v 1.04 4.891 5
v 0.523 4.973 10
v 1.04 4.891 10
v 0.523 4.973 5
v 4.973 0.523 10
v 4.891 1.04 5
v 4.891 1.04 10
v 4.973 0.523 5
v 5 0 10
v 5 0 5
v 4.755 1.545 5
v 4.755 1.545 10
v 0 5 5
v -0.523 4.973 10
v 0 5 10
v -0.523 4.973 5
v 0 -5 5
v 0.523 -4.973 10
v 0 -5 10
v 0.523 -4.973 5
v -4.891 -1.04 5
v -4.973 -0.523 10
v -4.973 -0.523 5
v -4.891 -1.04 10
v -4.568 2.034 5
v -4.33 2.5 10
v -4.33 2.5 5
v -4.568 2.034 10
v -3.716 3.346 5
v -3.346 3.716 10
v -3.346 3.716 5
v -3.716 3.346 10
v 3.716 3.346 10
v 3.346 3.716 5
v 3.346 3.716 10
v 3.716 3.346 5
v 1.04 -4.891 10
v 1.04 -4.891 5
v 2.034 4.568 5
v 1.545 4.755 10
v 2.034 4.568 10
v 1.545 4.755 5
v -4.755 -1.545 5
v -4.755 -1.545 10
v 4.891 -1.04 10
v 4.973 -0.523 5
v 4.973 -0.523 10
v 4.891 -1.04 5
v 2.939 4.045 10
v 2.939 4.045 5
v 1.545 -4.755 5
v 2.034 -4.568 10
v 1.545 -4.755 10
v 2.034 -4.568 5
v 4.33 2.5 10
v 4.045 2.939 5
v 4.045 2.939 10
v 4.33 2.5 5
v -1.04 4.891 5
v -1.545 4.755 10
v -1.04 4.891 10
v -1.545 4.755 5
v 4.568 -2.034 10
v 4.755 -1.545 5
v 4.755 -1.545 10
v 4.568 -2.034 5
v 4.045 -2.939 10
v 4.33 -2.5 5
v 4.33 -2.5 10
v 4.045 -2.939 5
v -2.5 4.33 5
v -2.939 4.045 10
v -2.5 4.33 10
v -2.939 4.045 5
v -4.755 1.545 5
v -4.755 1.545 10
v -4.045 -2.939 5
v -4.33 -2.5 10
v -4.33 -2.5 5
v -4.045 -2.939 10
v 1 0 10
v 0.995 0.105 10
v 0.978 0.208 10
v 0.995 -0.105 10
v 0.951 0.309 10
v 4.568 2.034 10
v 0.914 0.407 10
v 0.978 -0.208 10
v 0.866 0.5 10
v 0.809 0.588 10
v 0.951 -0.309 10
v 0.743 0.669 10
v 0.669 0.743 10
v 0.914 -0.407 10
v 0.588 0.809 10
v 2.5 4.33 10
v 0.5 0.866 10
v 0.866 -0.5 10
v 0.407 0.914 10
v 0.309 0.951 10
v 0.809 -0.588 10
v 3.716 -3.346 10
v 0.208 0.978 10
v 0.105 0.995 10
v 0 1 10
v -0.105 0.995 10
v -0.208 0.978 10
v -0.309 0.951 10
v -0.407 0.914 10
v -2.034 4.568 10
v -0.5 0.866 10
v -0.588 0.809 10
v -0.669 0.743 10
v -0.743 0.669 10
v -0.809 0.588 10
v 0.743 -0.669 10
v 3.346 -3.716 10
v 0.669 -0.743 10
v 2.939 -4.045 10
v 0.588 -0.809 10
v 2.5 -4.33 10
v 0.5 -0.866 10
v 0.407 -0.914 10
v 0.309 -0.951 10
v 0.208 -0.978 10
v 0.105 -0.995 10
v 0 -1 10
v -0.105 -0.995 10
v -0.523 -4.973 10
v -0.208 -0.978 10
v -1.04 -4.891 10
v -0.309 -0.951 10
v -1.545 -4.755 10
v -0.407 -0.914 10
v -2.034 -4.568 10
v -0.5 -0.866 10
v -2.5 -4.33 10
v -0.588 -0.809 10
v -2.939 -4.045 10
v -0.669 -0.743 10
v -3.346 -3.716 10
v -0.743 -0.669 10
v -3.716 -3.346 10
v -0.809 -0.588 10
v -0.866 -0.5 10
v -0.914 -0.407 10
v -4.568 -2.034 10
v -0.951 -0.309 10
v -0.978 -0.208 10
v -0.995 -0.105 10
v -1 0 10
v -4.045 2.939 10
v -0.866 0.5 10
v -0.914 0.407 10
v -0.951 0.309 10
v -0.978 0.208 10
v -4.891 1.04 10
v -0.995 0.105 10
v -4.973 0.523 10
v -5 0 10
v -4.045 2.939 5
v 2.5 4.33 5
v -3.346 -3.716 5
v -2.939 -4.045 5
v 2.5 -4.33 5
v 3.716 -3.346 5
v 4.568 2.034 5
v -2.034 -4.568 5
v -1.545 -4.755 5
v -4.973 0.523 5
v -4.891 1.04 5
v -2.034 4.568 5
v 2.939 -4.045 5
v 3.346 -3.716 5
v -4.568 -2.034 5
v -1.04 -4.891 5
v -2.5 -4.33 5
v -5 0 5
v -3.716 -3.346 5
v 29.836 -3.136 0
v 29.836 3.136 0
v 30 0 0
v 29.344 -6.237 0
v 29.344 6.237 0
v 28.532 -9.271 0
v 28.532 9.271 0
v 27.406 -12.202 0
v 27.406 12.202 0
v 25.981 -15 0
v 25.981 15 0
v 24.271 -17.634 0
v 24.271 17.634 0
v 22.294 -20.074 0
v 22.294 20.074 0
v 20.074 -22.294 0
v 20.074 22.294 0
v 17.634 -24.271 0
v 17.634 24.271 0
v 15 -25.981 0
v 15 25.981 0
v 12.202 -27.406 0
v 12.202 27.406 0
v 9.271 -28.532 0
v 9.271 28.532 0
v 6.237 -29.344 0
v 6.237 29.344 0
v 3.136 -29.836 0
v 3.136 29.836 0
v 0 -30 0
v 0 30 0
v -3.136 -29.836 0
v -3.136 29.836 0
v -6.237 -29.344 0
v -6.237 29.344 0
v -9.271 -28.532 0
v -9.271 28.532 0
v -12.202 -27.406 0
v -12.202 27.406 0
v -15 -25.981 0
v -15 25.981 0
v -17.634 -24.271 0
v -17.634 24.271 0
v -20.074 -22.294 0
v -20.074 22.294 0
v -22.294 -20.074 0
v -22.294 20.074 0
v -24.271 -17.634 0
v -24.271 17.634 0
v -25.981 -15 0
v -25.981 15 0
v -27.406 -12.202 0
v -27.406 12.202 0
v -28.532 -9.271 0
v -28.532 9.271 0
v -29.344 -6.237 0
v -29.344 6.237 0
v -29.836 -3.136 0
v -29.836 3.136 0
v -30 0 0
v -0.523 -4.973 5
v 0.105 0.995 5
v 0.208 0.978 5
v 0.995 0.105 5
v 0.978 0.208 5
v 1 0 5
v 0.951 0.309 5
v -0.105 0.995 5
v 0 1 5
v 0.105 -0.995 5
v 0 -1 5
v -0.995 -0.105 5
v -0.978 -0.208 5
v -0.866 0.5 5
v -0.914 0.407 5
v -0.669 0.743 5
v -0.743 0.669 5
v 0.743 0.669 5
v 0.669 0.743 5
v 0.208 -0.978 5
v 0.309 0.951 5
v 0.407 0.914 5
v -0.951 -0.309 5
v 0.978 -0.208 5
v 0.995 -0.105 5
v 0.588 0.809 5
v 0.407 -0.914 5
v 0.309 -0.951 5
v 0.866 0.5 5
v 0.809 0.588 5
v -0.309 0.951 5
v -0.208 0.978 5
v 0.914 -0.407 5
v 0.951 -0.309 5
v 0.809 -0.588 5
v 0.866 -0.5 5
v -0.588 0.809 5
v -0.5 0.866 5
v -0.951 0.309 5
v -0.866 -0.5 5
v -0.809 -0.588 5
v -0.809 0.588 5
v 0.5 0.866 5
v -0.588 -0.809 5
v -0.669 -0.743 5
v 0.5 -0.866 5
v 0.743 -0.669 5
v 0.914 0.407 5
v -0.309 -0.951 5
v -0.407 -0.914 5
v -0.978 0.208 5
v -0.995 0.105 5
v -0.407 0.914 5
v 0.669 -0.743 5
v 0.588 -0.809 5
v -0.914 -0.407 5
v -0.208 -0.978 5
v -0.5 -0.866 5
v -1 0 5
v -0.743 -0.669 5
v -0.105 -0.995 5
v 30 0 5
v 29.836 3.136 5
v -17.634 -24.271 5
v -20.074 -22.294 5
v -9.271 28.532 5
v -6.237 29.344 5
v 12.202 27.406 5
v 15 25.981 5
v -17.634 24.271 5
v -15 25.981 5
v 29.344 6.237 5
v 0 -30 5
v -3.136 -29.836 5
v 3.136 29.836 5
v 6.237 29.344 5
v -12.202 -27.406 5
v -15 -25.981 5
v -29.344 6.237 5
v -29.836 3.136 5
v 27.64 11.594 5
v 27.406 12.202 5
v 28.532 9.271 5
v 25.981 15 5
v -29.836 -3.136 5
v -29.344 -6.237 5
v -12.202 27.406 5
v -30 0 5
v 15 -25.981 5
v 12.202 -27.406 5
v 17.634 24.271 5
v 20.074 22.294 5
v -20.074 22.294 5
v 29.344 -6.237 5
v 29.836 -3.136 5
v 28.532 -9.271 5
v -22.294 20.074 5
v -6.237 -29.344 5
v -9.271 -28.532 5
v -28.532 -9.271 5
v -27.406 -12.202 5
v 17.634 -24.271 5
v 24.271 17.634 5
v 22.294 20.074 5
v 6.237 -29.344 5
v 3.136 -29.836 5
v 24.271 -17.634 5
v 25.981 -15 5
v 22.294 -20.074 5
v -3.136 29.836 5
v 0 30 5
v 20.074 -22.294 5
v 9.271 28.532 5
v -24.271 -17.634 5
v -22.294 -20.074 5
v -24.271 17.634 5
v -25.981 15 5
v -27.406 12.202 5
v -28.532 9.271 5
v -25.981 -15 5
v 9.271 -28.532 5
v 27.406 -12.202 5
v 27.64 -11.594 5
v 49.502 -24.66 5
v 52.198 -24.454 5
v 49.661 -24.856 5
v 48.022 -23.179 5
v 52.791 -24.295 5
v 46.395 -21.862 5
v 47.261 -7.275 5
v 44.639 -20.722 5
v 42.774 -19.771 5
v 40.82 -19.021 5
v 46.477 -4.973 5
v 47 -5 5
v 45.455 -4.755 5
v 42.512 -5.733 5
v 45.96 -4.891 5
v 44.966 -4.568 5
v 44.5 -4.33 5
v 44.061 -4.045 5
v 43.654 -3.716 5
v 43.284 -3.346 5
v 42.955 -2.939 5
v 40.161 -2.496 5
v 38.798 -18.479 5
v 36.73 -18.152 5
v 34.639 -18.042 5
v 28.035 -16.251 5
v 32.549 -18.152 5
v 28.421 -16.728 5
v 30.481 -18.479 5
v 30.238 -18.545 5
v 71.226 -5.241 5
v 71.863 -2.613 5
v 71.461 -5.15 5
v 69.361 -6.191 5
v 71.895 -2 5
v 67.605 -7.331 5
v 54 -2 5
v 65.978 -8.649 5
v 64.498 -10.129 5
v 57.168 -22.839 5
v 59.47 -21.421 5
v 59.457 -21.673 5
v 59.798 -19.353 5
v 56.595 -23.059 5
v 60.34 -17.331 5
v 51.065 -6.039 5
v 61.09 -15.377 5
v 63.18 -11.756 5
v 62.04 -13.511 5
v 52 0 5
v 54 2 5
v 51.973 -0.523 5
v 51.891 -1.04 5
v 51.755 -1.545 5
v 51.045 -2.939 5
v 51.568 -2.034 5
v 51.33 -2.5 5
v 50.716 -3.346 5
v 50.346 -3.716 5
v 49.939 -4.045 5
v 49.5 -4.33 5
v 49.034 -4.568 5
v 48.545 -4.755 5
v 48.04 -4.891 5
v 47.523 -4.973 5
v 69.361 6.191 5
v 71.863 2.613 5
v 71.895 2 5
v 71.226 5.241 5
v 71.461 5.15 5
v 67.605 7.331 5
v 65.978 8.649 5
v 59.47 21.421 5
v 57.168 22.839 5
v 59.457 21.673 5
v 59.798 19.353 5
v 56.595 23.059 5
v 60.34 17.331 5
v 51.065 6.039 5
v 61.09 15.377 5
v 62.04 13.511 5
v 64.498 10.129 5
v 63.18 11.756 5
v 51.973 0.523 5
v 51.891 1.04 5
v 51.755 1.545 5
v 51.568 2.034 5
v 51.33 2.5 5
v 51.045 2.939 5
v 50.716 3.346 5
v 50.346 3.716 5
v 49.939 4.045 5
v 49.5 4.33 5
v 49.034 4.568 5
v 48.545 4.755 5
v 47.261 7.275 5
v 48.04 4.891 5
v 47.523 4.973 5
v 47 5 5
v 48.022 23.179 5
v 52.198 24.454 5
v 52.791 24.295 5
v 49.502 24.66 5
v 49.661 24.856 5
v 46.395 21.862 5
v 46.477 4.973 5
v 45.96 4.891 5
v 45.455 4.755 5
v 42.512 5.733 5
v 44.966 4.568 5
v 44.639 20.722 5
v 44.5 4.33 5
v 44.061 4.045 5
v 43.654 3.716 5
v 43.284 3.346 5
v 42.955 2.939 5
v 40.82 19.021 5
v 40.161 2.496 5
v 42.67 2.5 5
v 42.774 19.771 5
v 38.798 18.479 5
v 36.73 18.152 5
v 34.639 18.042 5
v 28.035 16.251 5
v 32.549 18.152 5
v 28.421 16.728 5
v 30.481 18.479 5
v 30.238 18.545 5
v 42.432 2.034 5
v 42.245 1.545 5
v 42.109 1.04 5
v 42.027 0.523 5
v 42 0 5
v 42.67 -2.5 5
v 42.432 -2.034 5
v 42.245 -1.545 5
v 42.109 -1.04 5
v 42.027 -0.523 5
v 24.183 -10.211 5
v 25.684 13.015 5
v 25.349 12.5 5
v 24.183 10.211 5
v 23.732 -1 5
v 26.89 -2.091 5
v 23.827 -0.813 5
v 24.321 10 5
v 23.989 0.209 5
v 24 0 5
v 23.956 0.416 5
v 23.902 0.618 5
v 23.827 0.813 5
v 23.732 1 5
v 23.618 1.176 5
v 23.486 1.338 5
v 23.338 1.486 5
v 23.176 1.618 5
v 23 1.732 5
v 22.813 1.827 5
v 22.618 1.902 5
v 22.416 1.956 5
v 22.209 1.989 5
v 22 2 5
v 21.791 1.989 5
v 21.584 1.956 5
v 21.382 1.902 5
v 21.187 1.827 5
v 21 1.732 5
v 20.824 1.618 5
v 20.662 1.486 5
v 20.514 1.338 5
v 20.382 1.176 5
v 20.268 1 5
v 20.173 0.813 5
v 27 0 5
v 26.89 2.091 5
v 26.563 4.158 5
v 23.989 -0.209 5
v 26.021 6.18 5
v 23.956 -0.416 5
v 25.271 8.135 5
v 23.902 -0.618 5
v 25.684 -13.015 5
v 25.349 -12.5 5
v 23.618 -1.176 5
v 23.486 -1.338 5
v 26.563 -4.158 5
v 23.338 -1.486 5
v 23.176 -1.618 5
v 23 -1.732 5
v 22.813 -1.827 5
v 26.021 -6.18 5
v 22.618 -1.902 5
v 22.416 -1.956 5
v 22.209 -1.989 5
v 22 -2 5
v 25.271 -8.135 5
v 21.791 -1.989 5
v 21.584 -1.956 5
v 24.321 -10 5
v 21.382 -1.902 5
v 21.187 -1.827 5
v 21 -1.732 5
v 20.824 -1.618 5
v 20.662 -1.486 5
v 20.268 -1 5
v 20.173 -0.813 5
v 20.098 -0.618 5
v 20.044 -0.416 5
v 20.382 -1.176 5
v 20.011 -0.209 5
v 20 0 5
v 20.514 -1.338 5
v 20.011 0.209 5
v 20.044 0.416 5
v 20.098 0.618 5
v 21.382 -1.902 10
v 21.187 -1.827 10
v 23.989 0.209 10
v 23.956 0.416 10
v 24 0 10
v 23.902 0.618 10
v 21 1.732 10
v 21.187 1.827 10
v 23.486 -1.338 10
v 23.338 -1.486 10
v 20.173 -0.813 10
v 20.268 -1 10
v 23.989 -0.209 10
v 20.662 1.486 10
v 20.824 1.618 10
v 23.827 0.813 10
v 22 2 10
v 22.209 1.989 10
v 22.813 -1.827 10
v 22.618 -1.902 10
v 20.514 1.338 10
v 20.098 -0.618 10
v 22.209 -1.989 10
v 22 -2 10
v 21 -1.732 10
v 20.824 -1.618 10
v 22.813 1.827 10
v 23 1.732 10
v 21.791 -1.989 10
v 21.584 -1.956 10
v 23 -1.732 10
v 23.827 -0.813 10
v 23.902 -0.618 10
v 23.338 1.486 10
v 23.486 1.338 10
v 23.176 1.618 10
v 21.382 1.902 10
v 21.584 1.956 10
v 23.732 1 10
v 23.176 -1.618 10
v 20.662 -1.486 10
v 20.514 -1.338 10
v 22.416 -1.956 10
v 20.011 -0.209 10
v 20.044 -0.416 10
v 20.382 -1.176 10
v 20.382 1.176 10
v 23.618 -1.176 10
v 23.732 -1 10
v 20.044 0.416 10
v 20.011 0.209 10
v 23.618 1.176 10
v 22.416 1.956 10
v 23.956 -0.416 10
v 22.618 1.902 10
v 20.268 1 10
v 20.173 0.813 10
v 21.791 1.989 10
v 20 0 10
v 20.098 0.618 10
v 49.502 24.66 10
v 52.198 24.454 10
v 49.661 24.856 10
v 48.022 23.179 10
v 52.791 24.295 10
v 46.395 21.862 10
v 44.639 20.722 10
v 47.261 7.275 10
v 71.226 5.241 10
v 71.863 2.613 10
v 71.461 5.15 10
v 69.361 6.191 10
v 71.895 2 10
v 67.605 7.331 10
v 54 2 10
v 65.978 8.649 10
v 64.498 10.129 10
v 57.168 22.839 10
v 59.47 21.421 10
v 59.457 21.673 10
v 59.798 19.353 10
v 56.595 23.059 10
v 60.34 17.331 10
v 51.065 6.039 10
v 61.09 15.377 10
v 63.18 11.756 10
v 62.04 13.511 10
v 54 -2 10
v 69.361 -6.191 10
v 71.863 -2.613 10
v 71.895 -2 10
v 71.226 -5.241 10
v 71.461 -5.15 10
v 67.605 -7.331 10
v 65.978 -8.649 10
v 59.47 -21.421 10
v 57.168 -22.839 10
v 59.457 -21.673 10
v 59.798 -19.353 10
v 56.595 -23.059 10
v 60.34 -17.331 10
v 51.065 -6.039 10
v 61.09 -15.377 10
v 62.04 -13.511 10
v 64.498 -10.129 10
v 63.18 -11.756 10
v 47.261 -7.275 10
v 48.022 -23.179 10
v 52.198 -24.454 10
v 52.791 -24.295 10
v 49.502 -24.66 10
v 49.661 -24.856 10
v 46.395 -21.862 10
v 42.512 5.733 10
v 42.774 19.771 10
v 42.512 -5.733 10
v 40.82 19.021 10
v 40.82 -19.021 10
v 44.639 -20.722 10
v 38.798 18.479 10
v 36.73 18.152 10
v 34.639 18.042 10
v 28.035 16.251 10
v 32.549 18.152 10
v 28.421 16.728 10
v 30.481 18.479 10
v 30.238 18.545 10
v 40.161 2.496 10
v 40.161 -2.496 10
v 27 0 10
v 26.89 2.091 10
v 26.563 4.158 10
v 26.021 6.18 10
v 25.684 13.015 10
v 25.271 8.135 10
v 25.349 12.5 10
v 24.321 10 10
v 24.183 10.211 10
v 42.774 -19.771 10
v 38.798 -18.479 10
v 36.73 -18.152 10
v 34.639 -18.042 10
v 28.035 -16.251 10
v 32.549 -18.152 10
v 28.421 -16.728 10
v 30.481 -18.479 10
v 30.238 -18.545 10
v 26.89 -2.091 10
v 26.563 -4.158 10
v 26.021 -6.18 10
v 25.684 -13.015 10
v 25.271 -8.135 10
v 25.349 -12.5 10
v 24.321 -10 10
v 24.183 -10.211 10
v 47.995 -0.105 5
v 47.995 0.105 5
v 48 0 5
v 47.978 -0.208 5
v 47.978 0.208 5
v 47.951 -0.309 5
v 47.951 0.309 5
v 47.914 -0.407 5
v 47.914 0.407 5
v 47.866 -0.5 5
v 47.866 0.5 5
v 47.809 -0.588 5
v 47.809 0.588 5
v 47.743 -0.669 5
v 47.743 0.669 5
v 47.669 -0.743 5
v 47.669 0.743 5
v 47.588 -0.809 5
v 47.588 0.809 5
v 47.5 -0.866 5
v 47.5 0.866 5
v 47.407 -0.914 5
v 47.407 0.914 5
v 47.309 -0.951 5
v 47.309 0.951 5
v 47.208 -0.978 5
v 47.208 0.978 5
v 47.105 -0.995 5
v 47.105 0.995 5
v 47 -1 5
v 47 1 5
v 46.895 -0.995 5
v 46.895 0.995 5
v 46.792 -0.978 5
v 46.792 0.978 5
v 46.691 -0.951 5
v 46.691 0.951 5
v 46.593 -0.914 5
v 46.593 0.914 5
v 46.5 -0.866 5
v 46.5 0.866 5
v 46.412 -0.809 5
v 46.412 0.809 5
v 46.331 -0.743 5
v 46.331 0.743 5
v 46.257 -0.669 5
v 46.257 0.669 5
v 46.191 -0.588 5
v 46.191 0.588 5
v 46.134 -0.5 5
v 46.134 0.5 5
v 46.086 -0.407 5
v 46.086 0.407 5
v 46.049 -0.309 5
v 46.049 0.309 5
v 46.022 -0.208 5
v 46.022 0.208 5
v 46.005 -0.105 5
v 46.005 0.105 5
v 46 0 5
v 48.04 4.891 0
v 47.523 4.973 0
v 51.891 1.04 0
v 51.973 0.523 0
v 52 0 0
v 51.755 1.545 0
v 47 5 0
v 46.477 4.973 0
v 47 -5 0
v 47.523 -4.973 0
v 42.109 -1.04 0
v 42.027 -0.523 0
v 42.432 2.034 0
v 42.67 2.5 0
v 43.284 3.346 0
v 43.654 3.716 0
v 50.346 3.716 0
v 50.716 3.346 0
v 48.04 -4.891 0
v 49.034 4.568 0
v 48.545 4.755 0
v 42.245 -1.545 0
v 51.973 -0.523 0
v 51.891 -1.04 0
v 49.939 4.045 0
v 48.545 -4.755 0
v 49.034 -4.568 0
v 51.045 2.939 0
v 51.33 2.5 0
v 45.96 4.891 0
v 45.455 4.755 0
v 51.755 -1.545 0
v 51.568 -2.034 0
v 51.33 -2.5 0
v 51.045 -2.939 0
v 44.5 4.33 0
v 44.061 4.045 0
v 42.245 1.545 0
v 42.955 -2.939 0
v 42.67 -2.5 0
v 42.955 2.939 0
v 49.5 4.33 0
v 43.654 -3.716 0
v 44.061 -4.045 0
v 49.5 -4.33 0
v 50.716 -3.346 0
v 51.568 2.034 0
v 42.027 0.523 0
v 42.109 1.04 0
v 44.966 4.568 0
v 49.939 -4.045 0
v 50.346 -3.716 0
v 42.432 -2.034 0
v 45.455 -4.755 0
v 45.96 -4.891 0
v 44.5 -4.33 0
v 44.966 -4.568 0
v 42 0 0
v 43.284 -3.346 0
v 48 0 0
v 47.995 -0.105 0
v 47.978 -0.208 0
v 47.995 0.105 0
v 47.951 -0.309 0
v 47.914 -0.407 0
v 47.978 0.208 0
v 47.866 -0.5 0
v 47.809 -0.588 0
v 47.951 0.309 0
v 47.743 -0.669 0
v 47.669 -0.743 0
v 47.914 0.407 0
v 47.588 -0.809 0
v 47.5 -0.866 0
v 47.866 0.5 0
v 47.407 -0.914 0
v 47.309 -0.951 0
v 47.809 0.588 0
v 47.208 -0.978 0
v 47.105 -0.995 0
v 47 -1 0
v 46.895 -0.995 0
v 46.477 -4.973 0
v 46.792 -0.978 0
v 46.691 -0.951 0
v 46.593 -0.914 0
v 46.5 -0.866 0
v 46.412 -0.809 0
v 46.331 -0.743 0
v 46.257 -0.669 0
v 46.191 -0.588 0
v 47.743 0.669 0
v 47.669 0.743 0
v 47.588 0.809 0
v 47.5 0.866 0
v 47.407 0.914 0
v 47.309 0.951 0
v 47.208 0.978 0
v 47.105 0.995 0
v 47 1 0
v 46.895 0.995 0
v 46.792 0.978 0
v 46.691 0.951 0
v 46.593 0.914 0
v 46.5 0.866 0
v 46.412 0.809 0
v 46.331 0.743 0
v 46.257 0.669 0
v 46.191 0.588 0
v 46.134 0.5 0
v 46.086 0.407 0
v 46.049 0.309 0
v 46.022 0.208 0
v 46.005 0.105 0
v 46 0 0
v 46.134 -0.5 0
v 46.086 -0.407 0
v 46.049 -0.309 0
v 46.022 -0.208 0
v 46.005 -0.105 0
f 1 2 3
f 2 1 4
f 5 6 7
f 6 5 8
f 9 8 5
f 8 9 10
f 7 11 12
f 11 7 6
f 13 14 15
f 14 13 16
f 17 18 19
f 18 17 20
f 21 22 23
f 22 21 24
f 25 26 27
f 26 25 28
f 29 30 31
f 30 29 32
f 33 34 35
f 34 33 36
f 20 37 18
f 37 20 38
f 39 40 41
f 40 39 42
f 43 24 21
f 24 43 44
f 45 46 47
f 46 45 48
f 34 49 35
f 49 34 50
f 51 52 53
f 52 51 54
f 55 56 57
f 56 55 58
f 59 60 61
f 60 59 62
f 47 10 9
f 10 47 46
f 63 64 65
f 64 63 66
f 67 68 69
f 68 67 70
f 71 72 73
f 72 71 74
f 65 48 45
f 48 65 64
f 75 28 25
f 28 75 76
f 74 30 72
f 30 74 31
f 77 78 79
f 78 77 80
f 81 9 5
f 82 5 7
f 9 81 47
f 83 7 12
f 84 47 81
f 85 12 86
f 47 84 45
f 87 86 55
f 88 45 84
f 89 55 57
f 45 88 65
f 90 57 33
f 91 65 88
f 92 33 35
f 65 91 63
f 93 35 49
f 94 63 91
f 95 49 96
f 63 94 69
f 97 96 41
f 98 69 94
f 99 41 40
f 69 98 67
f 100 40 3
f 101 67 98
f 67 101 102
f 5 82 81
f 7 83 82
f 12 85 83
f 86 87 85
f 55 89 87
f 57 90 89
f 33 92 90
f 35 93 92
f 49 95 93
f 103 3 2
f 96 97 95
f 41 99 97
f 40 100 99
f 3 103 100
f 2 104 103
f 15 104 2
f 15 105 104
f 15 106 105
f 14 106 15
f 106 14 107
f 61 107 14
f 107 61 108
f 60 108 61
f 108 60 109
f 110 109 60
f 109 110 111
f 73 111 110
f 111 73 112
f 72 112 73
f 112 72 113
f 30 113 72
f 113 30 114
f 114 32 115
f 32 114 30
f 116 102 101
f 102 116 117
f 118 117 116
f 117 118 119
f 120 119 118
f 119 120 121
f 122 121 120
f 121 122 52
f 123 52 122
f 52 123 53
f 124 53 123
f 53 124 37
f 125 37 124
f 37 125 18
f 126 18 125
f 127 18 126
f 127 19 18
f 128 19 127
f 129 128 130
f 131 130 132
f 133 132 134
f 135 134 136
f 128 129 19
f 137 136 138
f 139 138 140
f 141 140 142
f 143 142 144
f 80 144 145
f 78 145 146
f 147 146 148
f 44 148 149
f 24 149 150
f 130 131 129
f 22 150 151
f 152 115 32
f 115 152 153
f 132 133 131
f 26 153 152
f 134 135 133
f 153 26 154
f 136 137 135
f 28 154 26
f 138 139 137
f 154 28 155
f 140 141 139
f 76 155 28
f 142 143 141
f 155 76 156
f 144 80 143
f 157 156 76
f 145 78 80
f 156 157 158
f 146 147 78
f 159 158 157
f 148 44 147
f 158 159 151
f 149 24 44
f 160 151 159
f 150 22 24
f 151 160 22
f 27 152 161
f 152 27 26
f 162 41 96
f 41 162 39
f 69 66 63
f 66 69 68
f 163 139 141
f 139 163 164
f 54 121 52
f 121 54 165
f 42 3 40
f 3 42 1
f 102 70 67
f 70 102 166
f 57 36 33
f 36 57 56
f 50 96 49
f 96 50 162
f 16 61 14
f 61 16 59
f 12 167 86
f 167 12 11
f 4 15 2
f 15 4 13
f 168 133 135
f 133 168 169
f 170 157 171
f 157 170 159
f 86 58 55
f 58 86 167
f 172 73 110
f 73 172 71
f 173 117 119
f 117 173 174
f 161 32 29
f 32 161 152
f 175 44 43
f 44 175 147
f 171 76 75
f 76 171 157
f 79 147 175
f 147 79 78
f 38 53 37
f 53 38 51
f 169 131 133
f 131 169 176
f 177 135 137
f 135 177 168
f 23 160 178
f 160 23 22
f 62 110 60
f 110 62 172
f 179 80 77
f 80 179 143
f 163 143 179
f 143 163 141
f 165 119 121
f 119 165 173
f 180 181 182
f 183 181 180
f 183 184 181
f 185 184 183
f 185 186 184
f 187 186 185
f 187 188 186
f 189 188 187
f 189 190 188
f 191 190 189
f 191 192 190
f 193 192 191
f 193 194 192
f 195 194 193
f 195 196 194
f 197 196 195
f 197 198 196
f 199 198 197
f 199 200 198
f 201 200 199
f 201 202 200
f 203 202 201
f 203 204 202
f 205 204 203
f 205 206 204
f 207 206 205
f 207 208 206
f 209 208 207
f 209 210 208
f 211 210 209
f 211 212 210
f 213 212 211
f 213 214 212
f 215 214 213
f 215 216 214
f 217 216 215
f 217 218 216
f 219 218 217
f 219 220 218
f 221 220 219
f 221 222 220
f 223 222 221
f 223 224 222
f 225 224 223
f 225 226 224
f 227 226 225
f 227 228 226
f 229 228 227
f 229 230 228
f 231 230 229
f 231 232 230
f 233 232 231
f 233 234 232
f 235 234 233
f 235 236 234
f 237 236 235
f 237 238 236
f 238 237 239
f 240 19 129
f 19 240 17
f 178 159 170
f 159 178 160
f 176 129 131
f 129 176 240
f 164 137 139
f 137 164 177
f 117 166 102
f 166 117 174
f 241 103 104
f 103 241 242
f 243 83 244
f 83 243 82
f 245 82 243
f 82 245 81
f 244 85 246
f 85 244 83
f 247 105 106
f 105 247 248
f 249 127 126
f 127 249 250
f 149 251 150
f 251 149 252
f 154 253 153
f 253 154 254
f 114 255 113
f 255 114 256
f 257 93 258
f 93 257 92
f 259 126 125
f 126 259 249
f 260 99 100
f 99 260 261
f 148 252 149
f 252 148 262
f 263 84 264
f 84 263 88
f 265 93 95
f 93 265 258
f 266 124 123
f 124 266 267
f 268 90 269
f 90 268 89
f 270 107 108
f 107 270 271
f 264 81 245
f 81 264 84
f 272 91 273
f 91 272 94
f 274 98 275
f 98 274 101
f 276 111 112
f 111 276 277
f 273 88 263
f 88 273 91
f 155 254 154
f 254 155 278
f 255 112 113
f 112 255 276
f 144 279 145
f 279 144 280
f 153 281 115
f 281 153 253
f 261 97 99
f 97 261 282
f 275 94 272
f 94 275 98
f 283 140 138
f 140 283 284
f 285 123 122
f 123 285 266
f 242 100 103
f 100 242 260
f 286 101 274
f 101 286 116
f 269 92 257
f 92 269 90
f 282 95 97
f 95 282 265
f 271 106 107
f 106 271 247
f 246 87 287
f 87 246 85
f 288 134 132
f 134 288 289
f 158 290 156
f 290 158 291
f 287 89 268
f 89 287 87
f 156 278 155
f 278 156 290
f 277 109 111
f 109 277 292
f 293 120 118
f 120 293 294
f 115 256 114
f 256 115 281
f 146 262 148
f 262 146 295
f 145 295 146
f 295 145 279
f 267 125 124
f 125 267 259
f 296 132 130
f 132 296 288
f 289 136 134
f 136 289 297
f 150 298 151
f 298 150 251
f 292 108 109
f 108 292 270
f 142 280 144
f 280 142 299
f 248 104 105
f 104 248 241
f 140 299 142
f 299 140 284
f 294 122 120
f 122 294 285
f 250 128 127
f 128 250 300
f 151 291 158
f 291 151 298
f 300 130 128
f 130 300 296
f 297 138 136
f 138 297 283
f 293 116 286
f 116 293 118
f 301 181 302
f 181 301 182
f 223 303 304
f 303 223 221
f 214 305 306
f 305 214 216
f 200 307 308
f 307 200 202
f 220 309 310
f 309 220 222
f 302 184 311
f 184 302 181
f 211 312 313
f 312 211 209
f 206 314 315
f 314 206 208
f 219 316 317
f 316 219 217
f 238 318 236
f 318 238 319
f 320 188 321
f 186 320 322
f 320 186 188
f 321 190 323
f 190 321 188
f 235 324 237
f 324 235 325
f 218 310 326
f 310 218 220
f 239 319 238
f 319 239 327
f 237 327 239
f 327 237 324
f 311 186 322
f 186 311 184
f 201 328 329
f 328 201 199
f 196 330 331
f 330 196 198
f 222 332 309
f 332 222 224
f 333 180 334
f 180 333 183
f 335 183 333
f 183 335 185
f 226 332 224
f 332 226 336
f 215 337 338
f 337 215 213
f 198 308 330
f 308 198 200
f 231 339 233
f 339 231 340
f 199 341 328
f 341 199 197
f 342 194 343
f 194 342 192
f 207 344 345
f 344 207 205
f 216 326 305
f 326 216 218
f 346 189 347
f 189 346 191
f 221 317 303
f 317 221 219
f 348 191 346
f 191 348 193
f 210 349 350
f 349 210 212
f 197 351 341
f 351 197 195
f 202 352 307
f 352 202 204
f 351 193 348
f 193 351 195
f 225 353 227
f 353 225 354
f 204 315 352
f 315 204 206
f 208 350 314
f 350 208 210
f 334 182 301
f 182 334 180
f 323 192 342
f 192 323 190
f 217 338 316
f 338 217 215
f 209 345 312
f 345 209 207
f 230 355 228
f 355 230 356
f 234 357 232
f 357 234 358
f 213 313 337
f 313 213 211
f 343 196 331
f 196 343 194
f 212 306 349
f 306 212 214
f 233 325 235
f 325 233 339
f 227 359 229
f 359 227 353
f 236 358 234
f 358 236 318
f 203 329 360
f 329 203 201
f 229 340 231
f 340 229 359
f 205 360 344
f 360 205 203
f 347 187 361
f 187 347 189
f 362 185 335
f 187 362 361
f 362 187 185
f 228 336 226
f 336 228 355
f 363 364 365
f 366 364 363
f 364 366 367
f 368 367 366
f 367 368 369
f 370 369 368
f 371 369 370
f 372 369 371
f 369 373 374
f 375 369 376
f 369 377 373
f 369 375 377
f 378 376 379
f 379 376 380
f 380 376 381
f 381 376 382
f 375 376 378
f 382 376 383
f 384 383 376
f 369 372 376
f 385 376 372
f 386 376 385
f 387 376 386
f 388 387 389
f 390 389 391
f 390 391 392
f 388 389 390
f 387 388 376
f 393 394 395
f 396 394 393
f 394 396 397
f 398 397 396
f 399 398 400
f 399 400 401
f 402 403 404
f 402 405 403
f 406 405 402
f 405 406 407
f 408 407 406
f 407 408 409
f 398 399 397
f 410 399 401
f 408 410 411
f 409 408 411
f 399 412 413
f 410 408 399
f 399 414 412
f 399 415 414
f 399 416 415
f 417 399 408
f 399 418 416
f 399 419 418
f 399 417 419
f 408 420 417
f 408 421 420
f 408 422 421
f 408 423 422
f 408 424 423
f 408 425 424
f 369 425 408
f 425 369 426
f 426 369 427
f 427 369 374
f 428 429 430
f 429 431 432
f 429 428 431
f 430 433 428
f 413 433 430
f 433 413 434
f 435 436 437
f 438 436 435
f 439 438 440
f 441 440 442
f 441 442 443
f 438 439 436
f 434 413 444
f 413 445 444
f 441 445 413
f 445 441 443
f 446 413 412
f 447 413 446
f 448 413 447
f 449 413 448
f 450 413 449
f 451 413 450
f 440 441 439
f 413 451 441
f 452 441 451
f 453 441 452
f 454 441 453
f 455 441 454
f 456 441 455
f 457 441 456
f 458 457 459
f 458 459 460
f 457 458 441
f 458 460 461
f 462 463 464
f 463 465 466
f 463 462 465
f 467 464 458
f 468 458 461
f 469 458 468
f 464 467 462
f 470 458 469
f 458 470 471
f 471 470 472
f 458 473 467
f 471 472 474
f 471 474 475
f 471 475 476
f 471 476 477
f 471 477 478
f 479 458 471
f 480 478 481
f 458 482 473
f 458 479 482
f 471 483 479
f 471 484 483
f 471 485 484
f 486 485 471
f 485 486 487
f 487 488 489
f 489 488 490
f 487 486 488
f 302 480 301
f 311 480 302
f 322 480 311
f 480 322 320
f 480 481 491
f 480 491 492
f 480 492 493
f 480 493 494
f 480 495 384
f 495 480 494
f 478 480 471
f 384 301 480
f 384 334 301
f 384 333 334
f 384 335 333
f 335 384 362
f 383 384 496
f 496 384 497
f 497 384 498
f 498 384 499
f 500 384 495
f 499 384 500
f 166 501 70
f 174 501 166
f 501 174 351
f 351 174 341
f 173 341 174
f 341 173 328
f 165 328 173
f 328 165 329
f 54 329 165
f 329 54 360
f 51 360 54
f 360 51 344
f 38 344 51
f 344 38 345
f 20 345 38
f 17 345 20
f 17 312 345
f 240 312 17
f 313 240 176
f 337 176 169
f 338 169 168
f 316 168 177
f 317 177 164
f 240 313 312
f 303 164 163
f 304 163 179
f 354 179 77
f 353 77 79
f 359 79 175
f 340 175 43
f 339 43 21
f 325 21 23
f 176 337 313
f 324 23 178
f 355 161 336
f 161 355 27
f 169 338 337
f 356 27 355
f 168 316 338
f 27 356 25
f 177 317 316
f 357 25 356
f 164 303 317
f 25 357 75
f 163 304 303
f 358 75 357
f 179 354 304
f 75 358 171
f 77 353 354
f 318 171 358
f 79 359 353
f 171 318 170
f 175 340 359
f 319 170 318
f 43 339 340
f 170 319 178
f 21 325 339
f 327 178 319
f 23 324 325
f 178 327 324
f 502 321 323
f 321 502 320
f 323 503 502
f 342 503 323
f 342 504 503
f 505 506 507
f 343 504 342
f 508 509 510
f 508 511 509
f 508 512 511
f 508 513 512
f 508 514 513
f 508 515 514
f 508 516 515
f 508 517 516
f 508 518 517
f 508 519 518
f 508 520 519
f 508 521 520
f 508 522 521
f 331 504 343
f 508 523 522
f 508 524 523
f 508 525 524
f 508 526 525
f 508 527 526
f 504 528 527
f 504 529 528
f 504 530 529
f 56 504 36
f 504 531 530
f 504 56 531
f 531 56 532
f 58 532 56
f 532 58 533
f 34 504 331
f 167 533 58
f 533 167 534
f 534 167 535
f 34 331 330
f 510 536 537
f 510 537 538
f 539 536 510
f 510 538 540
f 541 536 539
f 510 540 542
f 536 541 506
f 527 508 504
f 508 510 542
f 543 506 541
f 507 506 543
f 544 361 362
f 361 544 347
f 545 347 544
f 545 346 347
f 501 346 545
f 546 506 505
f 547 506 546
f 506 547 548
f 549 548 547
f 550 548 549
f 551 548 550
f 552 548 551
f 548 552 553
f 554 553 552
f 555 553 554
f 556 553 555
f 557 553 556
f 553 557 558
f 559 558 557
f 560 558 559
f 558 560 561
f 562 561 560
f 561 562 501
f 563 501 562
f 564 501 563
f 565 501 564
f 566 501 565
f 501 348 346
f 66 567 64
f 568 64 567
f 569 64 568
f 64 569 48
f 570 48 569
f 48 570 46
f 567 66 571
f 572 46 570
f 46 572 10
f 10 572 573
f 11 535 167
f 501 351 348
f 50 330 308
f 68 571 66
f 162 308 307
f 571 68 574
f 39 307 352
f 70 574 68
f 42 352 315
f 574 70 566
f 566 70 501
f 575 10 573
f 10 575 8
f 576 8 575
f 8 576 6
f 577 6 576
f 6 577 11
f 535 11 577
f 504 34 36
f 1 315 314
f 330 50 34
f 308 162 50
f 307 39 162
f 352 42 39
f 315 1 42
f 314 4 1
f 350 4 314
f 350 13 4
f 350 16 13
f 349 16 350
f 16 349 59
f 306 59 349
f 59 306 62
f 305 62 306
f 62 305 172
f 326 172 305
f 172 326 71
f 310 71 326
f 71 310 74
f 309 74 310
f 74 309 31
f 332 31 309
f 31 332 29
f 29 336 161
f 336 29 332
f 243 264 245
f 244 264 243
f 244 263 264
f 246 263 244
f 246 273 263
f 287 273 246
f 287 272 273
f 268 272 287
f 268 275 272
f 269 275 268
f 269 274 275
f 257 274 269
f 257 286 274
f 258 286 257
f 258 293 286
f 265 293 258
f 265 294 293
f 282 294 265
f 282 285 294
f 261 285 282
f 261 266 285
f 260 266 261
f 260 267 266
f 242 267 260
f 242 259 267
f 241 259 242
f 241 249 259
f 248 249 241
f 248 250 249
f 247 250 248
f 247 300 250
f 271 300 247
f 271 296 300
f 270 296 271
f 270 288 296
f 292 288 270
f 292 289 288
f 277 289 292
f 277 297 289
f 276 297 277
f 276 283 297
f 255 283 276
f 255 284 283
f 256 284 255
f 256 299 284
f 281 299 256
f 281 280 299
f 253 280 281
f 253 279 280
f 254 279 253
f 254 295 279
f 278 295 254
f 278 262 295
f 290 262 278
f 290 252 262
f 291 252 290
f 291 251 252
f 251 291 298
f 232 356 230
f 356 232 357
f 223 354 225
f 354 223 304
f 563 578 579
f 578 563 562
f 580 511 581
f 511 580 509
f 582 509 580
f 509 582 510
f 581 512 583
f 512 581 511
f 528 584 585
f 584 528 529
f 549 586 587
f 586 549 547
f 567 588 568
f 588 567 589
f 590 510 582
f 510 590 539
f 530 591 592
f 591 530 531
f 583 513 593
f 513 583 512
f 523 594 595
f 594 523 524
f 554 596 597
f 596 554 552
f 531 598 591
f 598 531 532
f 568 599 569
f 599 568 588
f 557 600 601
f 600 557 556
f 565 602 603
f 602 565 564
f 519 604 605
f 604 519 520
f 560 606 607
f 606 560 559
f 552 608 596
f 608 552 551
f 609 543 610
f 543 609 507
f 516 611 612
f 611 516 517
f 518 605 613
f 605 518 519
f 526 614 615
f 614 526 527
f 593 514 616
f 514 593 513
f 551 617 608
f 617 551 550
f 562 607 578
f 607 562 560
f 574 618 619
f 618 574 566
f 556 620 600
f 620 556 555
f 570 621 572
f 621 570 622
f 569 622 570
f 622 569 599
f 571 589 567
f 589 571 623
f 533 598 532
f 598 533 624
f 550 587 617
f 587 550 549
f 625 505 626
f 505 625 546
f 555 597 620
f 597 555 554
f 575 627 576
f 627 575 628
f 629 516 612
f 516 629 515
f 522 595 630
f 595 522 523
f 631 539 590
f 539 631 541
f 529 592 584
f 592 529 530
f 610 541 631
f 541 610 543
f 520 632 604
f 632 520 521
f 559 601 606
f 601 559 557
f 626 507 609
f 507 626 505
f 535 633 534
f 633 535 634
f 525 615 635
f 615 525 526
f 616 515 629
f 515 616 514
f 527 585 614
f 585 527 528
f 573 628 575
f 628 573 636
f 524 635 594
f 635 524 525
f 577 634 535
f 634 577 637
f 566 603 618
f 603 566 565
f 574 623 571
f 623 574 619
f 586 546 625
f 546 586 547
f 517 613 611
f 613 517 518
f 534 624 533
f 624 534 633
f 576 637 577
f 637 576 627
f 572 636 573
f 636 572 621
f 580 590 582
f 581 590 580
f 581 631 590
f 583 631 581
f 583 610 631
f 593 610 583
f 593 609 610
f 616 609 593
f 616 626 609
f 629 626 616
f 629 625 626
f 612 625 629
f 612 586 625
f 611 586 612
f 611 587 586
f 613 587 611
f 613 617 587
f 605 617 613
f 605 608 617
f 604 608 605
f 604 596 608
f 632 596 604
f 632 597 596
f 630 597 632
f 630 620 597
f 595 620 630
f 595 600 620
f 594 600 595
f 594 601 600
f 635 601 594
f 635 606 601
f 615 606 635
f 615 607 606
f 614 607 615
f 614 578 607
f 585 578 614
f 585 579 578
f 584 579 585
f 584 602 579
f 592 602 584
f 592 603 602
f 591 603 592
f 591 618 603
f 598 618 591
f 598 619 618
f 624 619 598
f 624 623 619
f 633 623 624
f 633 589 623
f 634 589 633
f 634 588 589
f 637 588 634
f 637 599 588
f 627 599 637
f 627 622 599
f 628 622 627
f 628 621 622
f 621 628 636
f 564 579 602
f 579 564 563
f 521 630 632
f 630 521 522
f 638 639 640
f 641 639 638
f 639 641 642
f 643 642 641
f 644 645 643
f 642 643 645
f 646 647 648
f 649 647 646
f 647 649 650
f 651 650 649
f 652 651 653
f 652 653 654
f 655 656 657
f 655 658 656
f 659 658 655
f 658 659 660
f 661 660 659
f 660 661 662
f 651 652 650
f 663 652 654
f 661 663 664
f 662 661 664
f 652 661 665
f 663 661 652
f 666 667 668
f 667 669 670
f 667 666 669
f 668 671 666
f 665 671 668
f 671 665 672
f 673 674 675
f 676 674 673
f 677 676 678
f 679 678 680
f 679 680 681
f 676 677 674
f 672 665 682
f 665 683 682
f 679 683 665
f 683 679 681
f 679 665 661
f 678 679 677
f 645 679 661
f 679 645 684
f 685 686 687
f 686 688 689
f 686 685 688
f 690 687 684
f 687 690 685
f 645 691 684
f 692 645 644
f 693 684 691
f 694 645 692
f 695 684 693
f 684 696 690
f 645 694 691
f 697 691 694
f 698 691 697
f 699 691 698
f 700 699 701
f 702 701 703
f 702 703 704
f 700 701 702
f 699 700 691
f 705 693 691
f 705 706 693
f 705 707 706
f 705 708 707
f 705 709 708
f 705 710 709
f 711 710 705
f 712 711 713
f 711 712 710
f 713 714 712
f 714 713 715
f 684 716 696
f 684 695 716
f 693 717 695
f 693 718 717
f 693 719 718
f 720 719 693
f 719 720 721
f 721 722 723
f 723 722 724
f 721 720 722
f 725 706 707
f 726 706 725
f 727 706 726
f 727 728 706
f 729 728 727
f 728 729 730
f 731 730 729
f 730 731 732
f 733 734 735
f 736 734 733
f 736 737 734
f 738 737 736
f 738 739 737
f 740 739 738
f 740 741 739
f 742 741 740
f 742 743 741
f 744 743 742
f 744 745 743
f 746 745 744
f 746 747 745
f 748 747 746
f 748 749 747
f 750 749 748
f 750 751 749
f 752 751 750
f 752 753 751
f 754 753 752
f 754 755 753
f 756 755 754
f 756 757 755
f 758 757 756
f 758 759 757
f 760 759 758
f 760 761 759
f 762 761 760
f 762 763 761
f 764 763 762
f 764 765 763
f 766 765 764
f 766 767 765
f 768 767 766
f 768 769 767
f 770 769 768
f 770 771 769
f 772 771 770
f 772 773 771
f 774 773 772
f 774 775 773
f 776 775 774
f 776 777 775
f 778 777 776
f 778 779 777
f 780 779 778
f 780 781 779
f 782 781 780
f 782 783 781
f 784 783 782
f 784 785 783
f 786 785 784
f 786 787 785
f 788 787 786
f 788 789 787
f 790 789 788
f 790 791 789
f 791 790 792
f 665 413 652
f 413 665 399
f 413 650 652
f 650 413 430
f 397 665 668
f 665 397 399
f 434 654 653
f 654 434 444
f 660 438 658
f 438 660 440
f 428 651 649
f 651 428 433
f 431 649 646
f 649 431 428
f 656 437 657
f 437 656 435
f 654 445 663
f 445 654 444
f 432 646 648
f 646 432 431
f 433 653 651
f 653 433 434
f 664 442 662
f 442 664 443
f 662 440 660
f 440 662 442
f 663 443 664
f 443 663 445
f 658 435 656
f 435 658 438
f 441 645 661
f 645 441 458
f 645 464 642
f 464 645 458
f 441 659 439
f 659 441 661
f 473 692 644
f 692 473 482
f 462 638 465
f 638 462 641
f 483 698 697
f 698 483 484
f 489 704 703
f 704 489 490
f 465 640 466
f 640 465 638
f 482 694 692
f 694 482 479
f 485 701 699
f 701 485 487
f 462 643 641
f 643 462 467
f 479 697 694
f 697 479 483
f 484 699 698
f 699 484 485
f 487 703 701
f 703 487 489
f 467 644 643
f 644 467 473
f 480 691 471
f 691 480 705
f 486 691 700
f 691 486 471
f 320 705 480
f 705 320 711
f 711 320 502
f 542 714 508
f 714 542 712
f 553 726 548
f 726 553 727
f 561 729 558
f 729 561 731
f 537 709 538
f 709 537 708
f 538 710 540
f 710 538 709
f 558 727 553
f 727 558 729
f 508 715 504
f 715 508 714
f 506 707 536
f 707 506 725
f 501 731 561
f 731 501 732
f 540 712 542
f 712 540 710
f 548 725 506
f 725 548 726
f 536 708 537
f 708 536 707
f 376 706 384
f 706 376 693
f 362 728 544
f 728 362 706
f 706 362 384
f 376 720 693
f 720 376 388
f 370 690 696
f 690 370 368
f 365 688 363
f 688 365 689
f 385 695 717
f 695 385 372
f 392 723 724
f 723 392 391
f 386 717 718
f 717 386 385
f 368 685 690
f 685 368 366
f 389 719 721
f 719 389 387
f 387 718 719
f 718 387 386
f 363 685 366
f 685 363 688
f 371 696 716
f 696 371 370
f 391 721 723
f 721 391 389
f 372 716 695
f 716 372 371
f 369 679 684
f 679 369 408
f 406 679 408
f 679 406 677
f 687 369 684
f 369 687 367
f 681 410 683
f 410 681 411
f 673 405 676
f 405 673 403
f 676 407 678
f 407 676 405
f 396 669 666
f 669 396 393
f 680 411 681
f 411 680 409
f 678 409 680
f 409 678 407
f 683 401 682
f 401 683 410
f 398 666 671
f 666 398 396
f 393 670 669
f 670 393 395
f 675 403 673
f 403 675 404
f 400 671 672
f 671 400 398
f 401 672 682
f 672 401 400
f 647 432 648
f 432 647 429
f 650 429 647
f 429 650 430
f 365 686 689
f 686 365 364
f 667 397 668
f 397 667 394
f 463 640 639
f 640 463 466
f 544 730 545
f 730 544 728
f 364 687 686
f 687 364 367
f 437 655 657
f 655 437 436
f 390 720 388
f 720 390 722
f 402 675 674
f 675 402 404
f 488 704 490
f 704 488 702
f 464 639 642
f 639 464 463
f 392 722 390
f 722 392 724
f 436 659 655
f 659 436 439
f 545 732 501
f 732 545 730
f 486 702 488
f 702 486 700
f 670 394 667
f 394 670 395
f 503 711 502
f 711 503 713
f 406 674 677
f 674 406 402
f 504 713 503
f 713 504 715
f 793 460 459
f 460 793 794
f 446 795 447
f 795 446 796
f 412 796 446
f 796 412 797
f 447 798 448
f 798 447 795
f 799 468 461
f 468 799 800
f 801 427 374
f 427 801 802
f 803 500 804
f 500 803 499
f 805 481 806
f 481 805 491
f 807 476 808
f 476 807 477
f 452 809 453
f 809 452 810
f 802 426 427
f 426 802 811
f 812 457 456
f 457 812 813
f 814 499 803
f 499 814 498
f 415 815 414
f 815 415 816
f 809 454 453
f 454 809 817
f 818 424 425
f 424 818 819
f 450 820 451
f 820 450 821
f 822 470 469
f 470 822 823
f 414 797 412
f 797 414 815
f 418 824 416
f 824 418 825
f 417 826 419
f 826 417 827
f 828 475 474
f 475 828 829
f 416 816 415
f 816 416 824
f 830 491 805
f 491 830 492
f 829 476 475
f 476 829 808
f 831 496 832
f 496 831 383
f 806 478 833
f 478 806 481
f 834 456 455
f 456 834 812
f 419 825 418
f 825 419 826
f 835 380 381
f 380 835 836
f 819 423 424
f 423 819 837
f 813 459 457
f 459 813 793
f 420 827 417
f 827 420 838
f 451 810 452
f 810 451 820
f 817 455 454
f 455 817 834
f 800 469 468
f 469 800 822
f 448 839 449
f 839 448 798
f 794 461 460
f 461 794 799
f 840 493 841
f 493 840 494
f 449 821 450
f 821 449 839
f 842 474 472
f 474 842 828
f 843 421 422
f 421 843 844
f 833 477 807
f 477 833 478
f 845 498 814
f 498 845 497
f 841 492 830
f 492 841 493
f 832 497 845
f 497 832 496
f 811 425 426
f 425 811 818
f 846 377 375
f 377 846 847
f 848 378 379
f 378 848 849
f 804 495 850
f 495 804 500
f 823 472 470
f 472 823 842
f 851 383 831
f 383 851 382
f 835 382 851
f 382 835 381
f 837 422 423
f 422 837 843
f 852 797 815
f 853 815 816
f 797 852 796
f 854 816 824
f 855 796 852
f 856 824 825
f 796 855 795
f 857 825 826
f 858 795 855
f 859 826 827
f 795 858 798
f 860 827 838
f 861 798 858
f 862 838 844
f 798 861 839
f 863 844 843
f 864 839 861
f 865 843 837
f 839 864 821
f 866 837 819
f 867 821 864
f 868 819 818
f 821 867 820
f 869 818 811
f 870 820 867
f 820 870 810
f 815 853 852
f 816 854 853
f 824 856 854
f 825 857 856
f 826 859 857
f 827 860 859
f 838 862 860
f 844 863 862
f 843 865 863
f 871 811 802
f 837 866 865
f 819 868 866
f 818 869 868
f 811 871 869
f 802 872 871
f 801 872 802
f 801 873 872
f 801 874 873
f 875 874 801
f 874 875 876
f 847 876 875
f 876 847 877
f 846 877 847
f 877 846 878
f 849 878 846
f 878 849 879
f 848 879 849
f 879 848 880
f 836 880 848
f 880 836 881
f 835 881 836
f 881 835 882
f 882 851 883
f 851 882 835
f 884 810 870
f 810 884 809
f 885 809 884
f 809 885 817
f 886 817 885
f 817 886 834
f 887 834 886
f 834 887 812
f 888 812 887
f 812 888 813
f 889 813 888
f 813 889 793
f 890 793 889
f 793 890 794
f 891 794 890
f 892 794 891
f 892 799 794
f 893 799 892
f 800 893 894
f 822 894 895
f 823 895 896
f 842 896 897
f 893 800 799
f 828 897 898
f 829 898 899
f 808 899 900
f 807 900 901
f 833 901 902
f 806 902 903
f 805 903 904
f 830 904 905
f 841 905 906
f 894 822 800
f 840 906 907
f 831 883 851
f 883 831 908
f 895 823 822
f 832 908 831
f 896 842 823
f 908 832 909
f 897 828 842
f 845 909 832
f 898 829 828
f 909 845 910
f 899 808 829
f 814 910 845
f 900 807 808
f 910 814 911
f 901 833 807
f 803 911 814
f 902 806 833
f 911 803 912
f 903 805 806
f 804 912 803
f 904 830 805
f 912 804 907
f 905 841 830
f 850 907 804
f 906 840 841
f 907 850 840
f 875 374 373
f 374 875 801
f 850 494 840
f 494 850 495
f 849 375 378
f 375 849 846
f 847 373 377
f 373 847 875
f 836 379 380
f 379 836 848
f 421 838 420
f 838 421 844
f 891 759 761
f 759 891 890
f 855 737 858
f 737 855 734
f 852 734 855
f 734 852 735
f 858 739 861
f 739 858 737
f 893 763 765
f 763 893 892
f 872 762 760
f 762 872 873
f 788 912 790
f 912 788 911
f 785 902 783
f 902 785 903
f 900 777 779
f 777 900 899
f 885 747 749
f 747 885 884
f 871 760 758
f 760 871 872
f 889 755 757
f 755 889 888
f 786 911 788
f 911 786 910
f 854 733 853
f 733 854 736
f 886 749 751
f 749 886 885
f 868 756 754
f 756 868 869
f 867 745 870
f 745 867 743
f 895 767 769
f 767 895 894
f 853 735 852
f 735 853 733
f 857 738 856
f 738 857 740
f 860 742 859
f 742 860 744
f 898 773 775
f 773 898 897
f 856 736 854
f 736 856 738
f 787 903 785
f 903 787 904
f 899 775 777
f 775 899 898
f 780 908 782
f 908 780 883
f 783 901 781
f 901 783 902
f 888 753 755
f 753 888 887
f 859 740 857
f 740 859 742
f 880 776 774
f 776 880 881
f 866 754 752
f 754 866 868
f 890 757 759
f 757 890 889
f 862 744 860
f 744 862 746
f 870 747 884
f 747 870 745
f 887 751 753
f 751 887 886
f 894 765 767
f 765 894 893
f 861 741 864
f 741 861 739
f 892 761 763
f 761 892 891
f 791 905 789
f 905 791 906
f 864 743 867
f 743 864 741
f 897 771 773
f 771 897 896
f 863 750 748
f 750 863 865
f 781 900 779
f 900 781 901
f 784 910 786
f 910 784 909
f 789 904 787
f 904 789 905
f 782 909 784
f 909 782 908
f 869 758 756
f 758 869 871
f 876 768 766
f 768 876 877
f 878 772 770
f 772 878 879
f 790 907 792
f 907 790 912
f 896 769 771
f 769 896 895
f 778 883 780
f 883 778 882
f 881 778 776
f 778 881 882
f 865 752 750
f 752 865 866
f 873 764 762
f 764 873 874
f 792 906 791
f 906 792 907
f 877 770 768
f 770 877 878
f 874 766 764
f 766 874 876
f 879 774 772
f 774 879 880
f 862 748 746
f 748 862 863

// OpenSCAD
// Distance between wheels
WHEEL_VERTICAL_OFFSET=0.1;

DRIVE_WHEEL_RADIUS=30;
DRIVE_WHEEL_PIN_LENGTH=10;
DRIVE_WHEEL_PIN_RADIUS=2;
DRIVE_WHEEL_PIN_OFFSET=22;
DRIVE_WHEEL_THICKNESS=5;
DRIVE_WHEEL_AXLE_LENGTH=10;
DRIVE_WHEEL_AXLE_RADIUS=5;
DRIVE_WHEEL_AXLE_HOLE_RADIUS=1;

DRIVEN_WHEEL_RADIUS=25;
DRIVEN_WHEEL_THICKNESS=5;
DRIVEN_WHEEL_AXLE_LENGTH=DRIVE_WHEEL_THICKNESS;
DRIVEN_WHEEL_AXLE_RADIUS=5;
DRIVEN_WHEEL_AXLE_HOLE_RADIUS=1;
DRIVEN_WHEEL_NOTCH_OFFSET=7;
DRIVEN_WHEEL_CROSS_RADIUS=20;
DRIVEN_WHEEL_CROSS_OFFSET=20 + DRIVEN_WHEEL_RADIUS - 5;

NOTCHES=5;

DETAIL=60;


module drawDriveWheel()
{
	cylinder( DRIVE_WHEEL_THICKNESS, DRIVE_WHEEL_RADIUS, DRIVE_WHEEL_RADIUS, $fn=DETAIL );

	// Draw pin
	translate( [DRIVE_WHEEL_PIN_OFFSET, 0, 0] )
	cylinder( DRIVE_WHEEL_PIN_LENGTH,  DRIVE_WHEEL_PIN_RADIUS, DRIVE_WHEEL_PIN_RADIUS, $fn=DETAIL );

	// Draw center axle
	difference()
	{
		cylinder( DRIVE_WHEEL_AXLE_LENGTH, DRIVE_WHEEL_AXLE_RADIUS, DRIVE_WHEEL_AXLE_RADIUS, $fn=DETAIL );

		cylinder( DRIVE_WHEEL_AXLE_LENGTH, DRIVE_WHEEL_AXLE_HOLE_RADIUS, DRIVE_WHEEL_AXLE_HOLE_RADIUS, $fn=DETAIL );
	}
}

module drawDrivenWheel()
{
	difference()
	{
		cylinder( DRIVEN_WHEEL_THICKNESS, DRIVEN_WHEEL_RADIUS, DRIVEN_WHEEL_RADIUS, $fn=DETAIL );

		for ( i  = [ 0 : NOTCHES ] )
		{
			drawDrivenWheelNotch(360/NOTCHES,i);
		}
	}

	// Draw center axle
	translate([0,0,-1 * DRIVEN_WHEEL_AXLE_LENGTH])
	difference()
	{
		cylinder( DRIVEN_WHEEL_AXLE_LENGTH, DRIVEN_WHEEL_AXLE_RADIUS, DRIVEN_WHEEL_AXLE_RADIUS, $fn=DETAIL );

		cylinder( DRIVEN_WHEEL_AXLE_LENGTH, DRIVEN_WHEEL_AXLE_HOLE_RADIUS, DRIVEN_WHEEL_AXLE_HOLE_RADIUS, $fn=DETAIL );
	}
}

module drawDrivenWheelNotch(rotation, index)
{
	rotate([0,0,rotation*index])
	translate([DRIVEN_WHEEL_NOTCH_OFFSET,-1 * DRIVE_WHEEL_PIN_RADIUS,0])
	cube([DRIVEN_WHEEL_RADIUS-DRIVEN_WHEEL_NOTCH_OFFSET, DRIVE_WHEEL_PIN_RADIUS*2, DRIVEN_WHEEL_THICKNESS]);
	rotate([0,0,rotation/2+rotation*index])
	translate([DRIVEN_WHEEL_CROSS_OFFSET,0,0])
	cylinder( DRIVEN_WHEEL_THICKNESS, DRIVEN_WHEEL_CROSS_RADIUS, DRIVEN_WHEEL_CROSS_RADIUS, $fn=DETAIL );
}

drawDriveWheel();
translate( [ DRIVEN_WHEEL_RADIUS+DRIVE_WHEEL_PIN_OFFSET, 0, DRIVE_WHEEL_THICKNESS] )
drawDrivenWheel();
